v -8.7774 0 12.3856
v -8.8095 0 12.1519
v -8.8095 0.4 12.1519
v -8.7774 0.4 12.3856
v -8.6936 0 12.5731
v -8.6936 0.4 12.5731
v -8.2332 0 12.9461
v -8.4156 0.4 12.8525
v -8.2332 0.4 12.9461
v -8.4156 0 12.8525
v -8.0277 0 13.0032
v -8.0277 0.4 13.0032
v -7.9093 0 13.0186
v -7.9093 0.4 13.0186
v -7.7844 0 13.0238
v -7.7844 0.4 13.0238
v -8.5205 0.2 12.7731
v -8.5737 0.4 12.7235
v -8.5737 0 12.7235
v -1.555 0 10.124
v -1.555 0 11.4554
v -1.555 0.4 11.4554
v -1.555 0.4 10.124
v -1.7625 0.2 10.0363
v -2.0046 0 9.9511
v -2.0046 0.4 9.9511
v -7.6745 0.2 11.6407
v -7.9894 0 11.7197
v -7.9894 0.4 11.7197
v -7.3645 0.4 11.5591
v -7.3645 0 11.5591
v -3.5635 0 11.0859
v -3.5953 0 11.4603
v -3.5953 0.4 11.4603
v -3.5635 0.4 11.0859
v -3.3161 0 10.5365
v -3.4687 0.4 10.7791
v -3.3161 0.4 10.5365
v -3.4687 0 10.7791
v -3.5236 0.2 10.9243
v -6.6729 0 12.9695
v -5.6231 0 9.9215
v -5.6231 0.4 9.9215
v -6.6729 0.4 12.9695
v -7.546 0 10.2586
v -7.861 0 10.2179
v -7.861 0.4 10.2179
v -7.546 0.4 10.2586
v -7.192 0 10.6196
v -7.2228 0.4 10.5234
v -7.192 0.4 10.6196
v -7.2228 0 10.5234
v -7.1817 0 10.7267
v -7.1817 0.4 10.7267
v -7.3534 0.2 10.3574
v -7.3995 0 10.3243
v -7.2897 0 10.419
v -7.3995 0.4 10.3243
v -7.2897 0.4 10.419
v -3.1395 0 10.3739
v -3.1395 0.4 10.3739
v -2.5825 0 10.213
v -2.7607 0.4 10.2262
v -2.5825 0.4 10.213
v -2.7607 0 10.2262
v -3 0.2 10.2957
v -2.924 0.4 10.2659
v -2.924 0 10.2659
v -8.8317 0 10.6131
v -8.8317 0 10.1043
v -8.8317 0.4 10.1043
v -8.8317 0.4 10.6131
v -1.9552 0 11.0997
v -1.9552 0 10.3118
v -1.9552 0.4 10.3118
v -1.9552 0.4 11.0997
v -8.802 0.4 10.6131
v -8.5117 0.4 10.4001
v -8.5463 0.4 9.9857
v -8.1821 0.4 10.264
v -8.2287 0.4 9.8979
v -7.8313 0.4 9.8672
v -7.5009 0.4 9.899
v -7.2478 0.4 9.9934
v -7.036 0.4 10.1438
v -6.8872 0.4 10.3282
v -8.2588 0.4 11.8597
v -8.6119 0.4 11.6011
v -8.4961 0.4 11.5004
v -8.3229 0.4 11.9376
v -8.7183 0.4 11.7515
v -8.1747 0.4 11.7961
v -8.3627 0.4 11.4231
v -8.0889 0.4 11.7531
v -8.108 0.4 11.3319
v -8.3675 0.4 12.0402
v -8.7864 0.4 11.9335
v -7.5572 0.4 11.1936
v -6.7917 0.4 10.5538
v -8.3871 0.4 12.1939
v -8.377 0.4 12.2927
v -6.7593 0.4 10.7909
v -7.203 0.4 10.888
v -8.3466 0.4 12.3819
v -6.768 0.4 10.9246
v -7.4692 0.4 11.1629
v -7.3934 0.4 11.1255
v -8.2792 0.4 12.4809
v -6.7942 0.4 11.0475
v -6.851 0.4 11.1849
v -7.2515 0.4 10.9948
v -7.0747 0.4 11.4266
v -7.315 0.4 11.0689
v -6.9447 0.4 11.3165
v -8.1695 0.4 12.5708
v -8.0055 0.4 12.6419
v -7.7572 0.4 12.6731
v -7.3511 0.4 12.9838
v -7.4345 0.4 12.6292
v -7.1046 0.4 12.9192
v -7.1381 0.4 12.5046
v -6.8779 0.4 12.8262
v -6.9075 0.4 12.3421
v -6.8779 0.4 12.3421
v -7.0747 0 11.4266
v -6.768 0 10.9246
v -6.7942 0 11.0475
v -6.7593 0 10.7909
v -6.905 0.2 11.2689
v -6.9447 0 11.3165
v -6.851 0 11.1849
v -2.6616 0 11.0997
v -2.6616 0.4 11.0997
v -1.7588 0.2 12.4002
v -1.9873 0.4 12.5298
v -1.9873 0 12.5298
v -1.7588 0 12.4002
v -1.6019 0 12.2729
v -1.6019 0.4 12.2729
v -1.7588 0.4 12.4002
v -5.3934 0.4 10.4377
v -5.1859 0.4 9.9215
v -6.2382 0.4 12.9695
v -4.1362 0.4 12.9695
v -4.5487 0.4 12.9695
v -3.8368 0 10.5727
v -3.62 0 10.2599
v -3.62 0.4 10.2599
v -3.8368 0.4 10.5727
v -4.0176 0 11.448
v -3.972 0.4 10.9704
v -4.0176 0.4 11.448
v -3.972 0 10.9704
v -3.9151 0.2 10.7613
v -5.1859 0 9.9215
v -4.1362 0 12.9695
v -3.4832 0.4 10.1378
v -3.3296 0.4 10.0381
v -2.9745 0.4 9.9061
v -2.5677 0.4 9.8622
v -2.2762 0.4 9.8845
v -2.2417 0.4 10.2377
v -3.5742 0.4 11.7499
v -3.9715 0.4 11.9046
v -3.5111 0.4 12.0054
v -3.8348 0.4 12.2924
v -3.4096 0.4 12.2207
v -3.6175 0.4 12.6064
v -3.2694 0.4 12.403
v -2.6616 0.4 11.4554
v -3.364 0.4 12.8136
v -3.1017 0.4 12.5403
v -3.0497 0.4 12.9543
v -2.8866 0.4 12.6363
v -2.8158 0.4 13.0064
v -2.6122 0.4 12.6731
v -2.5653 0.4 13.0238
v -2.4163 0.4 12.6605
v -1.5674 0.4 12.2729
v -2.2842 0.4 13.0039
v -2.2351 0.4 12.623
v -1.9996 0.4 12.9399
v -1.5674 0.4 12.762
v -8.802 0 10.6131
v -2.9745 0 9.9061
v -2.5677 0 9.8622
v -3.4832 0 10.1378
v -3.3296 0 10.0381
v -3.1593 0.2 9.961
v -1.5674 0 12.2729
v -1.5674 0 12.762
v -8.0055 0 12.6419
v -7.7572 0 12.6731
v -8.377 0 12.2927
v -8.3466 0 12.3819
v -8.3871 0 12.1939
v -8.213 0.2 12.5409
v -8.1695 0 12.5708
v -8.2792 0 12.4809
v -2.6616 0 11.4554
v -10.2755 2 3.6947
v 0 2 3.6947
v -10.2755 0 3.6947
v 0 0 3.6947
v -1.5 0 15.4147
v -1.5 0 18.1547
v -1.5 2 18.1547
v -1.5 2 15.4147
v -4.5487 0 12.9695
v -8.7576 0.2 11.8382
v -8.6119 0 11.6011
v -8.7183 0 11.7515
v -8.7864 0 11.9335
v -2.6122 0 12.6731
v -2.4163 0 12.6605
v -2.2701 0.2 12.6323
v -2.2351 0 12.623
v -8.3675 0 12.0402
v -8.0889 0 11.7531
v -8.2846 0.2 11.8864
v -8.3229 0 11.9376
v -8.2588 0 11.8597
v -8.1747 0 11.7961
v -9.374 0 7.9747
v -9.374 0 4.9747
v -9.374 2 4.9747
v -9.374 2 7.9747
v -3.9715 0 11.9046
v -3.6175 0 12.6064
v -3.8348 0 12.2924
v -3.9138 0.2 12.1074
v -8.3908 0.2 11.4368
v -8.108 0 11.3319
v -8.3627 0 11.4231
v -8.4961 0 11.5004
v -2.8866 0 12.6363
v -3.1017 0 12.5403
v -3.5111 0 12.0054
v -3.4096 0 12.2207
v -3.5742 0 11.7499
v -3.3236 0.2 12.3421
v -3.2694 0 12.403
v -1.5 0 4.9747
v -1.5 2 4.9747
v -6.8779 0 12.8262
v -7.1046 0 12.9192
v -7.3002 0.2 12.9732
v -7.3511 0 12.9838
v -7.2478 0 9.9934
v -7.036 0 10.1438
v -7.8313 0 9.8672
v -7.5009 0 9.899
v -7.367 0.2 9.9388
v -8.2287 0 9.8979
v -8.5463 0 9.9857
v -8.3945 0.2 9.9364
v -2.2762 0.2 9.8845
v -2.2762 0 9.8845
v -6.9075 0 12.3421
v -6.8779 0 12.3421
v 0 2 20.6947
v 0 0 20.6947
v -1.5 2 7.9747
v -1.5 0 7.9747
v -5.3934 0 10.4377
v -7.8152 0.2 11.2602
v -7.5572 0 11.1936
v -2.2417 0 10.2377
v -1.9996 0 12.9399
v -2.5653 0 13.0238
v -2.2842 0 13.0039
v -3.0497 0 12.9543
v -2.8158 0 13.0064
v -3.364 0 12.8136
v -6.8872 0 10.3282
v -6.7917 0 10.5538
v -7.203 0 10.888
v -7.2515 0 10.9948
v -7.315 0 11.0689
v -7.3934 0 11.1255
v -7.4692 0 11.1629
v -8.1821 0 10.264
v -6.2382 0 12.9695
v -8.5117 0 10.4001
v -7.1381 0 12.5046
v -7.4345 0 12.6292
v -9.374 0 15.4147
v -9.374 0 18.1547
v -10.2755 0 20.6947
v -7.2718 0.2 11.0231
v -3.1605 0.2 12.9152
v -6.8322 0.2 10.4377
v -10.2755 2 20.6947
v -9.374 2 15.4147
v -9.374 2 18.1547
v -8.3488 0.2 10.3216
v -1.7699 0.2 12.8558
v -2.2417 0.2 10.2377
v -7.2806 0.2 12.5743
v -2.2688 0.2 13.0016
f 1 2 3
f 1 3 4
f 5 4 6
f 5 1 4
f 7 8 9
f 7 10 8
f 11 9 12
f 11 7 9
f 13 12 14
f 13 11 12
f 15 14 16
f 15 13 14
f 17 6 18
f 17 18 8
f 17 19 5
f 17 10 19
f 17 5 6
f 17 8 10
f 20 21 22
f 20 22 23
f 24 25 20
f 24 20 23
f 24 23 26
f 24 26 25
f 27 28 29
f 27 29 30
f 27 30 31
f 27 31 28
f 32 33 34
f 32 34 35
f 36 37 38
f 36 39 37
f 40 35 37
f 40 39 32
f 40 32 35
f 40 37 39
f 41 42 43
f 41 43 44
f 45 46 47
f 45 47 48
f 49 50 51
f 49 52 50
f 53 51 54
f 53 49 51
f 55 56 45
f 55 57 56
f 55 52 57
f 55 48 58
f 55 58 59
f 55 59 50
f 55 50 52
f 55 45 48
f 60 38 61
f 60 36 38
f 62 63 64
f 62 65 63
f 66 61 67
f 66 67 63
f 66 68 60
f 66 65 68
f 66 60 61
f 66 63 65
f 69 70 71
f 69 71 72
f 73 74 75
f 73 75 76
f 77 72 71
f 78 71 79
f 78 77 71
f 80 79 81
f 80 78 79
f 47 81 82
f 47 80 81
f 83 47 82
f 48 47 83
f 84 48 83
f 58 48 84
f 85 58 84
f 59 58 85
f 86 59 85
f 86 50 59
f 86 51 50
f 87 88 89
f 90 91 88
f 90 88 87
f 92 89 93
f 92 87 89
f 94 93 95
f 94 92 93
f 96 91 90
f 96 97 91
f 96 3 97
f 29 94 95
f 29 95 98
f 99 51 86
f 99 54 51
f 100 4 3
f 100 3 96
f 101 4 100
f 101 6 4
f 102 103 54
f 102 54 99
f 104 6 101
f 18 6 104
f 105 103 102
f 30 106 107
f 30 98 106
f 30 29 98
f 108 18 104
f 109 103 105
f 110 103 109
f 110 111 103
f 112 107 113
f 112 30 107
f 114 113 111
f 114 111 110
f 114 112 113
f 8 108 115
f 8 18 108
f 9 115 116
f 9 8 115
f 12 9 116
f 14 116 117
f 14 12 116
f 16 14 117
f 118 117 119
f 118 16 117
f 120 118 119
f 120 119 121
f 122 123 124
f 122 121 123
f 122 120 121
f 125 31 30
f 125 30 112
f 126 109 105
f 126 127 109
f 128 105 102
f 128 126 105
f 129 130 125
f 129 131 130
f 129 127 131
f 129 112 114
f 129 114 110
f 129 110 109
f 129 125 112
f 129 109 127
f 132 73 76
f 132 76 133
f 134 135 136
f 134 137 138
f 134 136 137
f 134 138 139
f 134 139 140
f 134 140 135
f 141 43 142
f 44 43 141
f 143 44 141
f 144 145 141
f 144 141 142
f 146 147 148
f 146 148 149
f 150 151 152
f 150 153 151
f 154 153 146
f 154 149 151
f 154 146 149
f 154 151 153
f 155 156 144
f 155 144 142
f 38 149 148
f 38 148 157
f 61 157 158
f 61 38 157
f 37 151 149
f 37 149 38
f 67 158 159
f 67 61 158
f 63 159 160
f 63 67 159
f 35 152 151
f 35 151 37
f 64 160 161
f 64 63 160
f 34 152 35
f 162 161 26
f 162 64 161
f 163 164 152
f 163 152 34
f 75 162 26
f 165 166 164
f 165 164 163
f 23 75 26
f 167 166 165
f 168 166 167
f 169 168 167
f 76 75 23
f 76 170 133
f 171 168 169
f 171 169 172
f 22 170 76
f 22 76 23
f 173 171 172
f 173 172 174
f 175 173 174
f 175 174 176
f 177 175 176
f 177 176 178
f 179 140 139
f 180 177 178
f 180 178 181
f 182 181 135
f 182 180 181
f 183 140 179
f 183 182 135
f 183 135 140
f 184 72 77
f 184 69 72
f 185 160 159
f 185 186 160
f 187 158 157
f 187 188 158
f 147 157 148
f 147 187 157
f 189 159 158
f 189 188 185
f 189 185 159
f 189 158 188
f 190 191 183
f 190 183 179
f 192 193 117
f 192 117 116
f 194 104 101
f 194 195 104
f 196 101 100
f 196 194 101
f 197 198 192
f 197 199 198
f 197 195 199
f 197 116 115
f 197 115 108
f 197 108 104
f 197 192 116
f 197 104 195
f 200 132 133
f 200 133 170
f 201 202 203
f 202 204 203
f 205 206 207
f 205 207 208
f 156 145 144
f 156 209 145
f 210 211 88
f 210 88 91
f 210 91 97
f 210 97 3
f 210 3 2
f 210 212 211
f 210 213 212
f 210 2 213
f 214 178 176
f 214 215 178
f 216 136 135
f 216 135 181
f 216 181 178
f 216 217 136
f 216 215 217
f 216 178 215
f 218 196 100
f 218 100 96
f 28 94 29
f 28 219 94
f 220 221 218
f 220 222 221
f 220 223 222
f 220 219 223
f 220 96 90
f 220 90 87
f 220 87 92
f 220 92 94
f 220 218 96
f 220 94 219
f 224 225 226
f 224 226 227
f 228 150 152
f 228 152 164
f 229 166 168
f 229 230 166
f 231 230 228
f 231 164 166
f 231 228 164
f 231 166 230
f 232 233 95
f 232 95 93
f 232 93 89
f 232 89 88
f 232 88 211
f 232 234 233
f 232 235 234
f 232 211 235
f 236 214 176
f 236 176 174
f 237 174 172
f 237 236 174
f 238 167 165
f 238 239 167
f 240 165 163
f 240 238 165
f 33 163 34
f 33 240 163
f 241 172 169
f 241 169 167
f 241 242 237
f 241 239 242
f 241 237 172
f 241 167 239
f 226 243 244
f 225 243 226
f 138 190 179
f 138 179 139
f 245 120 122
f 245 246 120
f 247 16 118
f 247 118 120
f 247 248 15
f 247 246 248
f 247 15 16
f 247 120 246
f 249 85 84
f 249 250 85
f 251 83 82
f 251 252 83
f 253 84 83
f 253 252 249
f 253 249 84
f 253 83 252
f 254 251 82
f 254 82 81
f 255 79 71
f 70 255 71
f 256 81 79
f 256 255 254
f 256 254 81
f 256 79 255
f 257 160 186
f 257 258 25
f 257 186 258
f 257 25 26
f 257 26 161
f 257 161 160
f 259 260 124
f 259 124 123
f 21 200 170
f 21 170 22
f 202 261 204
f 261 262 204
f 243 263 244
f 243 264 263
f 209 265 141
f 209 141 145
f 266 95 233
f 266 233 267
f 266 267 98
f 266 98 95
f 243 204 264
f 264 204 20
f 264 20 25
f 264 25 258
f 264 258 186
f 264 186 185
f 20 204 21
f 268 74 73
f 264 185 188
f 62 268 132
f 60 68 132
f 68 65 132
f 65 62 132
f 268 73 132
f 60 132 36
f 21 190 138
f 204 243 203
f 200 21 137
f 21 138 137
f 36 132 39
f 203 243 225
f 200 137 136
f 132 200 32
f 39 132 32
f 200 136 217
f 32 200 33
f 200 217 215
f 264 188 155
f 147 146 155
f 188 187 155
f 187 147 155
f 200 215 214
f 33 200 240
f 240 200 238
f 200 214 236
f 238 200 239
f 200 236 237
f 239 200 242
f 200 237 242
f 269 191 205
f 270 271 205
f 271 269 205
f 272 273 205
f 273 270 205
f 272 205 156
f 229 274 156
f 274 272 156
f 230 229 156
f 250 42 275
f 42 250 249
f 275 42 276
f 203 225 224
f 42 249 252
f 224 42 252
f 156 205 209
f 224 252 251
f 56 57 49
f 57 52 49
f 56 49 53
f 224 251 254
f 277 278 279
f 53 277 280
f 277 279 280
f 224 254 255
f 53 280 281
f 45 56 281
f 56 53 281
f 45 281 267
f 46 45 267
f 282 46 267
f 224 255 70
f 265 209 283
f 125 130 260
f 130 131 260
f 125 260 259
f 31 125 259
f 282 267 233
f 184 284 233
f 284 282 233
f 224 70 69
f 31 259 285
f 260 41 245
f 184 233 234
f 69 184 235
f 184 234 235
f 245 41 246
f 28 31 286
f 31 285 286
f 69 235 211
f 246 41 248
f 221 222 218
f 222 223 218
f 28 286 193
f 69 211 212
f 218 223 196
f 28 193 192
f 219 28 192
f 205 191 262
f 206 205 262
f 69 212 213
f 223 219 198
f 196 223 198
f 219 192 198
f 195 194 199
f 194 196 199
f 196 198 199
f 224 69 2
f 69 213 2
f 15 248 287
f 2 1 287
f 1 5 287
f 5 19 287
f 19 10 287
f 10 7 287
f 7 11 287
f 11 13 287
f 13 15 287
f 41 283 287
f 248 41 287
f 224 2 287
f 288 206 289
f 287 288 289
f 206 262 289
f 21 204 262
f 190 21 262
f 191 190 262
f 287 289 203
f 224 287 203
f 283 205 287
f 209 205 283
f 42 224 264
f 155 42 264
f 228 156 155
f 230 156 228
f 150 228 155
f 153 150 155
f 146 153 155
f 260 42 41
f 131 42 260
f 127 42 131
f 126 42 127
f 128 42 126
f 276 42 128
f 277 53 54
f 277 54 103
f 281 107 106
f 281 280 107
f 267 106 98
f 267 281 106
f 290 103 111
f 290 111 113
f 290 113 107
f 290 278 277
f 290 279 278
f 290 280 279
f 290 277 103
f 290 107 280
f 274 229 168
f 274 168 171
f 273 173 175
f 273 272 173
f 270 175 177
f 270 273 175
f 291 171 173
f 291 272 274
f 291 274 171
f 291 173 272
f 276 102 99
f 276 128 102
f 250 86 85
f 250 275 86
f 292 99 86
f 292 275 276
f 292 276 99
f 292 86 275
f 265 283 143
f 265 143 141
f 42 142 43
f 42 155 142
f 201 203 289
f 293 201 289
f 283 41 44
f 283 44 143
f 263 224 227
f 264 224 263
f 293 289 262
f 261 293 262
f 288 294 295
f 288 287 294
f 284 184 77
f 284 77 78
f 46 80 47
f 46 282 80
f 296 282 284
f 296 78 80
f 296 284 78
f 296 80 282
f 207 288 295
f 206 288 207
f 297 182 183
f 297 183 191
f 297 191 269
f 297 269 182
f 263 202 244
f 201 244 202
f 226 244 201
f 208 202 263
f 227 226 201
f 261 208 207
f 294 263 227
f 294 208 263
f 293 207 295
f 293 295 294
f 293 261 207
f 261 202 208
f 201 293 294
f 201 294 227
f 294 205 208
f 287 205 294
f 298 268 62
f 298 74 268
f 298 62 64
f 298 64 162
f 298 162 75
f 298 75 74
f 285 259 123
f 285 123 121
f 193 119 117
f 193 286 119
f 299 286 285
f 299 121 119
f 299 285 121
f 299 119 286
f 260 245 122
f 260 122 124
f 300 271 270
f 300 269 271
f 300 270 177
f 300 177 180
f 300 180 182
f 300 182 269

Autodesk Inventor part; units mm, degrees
ref_plane "YZ Plane" through (0, 0, 0) normal (1, 0, 0) x (0, 1, 0)
ref_plane "XZ Plane" through (0, 0, 0) normal (0, 1, 0) x (-1, 0, 0)
ref_plane "XY Plane" through (0, 0, 0) normal (0, 0, 1) x (1, 0, 0)
sketch "Эскиз1" plane through (0, 0, 0) normal (0, 1, 0) x (-1, 0, 0)
  line L0 (9.374, 18.1547) -> (1.5, 18.1547)
  line L1 (1.5, 18.1547) -> (1.5, 15.4147)
  line L2 (1.5, 15.4147) -> (9.374, 15.4147)
  line L3 (9.374, 15.4147) -> (9.374, 18.1547)
  line L4 (9.374, 7.9747) -> (1.5, 7.9747)
  line L5 (1.5, 7.9747) -> (1.5, 4.9747)
  line L6 (1.5, 4.9747) -> (9.374, 4.9747)
  line L7 (9.374, 4.9747) -> (9.374, 7.9747)
  line L8 (10.2755, 20.6947) -> (0, 20.6947)
  line L9 (0, 20.6947) -> (0, 3.6947)
  line L10 (0, 3.6947) -> (10.2755, 3.6947)
  line L11 (10.2755, 3.6947) -> (10.2755, 20.6947)
  point P0 (0, 0)
  dimension "d3" = 17
  dimension "d4" = 7.874
  dimension "d5" = 2.74
  dimension "d6" = 2.54
  dimension "d7" = 7.44
  dimension "d8" = 1.5
  dimension "d11" = 3
extrude "Выдавливание1" add sketch "Эскиз1" along normal blind 2
sketch "Эскиз3" plane through (0, 0, 0) normal (0, -1, 0) x (1, 0, 0)
  line L0 (-8.9898, 13.0238) -> (-0.8671, 13.0238) construction
  line L1 (-0.8671, 13.0238) -> (-0.8671, 9.5038) construction
  line L2 (-0.8671, 9.5038) -> (-8.9898, 9.5038) construction
  line L3 (-8.9898, 9.5038) -> (-8.9898, 13.0238) construction
  spline S0 degree 2 poles (-7.8313, 9.8672) (-8.1623, 9.8672) (-8.6267, 10.0055) (-8.8317, 10.1043) knots 0 0 0 1 2 2 2
  line L4 (-8.8317, 10.1043) -> (-8.8317, 10.6131)
  line L5 (-8.8317, 10.6131) -> (-8.802, 10.6131)
  spline S1 degree 2 poles (-8.802, 10.6131) (-8.602, 10.4254) (-8.0956, 10.2179) (-7.861, 10.2179) knots 0 0 0 1 2 2 2
  spline S2 degree 2 poles (-7.861, 10.2179) (-7.525, 10.2179) (-7.1817, 10.497) (-7.1817, 10.7267) knots 0 0 0 1 2 2 2
  spline S3 degree 2 poles (-7.1817, 10.7267) (-7.1817, 10.9095) (-7.362, 11.1367) (-7.5572, 11.1936) knots 0 0 0 1 2 2 2
  spline S4 degree 2 poles (-7.5572, 11.1936) (-7.6979, 11.2331) (-7.9326, 11.2874) (-8.108, 11.3319) knots 0 0 0 1 2 2 2
  spline S5 degree 2 poles (-8.108, 11.3319) (-8.2661, 11.3739) (-8.5155, 11.4998) (-8.6119, 11.6011) knots 0 0 0 1 2 2 2
  spline S6 degree 2 poles (-8.6119, 11.6011) (-8.7057, 11.7024) (-8.8095, 11.9741) (-8.8095, 12.1519) knots 0 0 0 1 2 2 2
  spline S7 degree 2 poles (-8.8095, 12.1519) (-8.8095, 12.5224) (-8.2315, 13.0238) (-7.7844, 13.0238) knots 0 0 0 1 2 2 2
  spline S8 degree 2 poles (-7.7844, 13.0238) (-7.5275, 13.0238) (-7.073, 12.9226) (-6.8779, 12.8262) knots 0 0 0 1 2 2 2
  line L6 (-6.8779, 12.8262) -> (-6.8779, 12.3421)
  line L7 (-6.8779, 12.3421) -> (-6.9075, 12.3421)
  spline S9 degree 2 poles (-6.9075, 12.3421) (-7.0533, 12.4755) (-7.5078, 12.6731) (-7.7572, 12.6731) knots 0 0 0 1 2 2 2
  spline S10 degree 2 poles (-7.7572, 12.6731) (-8.0388, 12.6731) (-8.3871, 12.4088) (-8.3871, 12.1939) knots 0 0 0 1 2 2 2
  spline S11 degree 2 poles (-8.3871, 12.1939) (-8.3871, 12.0012) (-8.1821, 11.7715) (-7.9894, 11.7197) knots 0 0 0 1 2 2 2
  spline S12 degree 2 poles (-7.9894, 11.7197) (-7.861, 11.6851) (-7.488, 11.5962) (-7.3645, 11.5591) knots 0 0 0 1 2 2 2
  spline S13 degree 2 poles (-7.3645, 11.5591) (-7.0508, 11.4628) (-6.7593, 11.075) (-6.7593, 10.7909) knots 0 0 0 1 2 2 2
  spline S14 degree 2 poles (-6.7593, 10.7909) (-6.7593, 10.6106) (-6.9051, 10.2648) (-7.036, 10.1438) knots 0 0 0 1 2 2 2
  spline S15 degree 2 poles (-7.036, 10.1438) (-7.1817, 10.0104) (-7.5522, 9.8672) (-7.8313, 9.8672) knots 0 0 0 1 2 2 2
  line L8 (-4.1362, 12.9695) -> (-5.1859, 9.9215)
  line L9 (-5.1859, 9.9215) -> (-5.6231, 9.9215)
  line L10 (-5.6231, 9.9215) -> (-6.6729, 12.9695)
  line L11 (-6.6729, 12.9695) -> (-6.2382, 12.9695)
  line L12 (-6.2382, 12.9695) -> (-5.3934, 10.4377)
  line L13 (-5.3934, 10.4377) -> (-4.5487, 12.9695)
  line L14 (-4.5487, 12.9695) -> (-4.1362, 12.9695)
  spline S16 degree 2 poles (-2.5677, 9.8622) (-2.8913, 9.8622) (-3.4273, 10.0598) (-3.62, 10.2599) knots 0 0 0 1 2 2 2
  spline S17 degree 2 poles (-3.62, 10.2599) (-3.8126, 10.4624) (-4.0176, 11.0602) (-4.0176, 11.448) knots 0 0 0 1 2 2 2
  spline S18 degree 2 poles (-4.0176, 11.448) (-4.0176, 11.816) (-3.8101, 12.3989) (-3.6175, 12.6064) knots 0 0 0 1 2 2 2
  spline S19 degree 2 poles (-3.6175, 12.6064) (-3.4322, 12.8065) (-2.8888, 13.0238) (-2.5653, 13.0238) knots 0 0 0 1 2 2 2
  spline S20 degree 2 poles (-2.5653, 13.0238) (-2.4096, 13.0238) (-2.1281, 12.9794) (-1.9996, 12.9399) knots 0 0 0 1 2 2 2
  spline S21 degree 2 poles (-1.9996, 12.9399) (-1.8959, 12.9102) (-1.6439, 12.8015) (-1.5674, 12.762) knots 0 0 0 1 2 2 2
  line L15 (-1.5674, 12.762) -> (-1.5674, 12.2729)
  line L16 (-1.5674, 12.2729) -> (-1.6019, 12.2729)
  spline S22 degree 2 poles (-1.6019, 12.2729) (-1.6785, 12.3396) (-1.8391, 12.4607) (-1.9873, 12.5298) knots 0 0 0 1 2 2 2
  spline S23 degree 2 poles (-1.9873, 12.5298) (-2.1108, 12.5916) (-2.4294, 12.6731) (-2.6122, 12.6731) knots 0 0 0 1 2 2 2
  spline S24 degree 2 poles (-2.6122, 12.6731) (-3.0518, 12.6731) (-3.5953, 12.0111) (-3.5953, 11.4603) knots 0 0 0 1 2 2 2
  spline S25 degree 2 poles (-3.5953, 11.4603) (-3.5953, 11.154) (-3.452, 10.6946) (-3.3161, 10.5365) knots 0 0 0 1 2 2 2
  spline S26 degree 2 poles (-3.3161, 10.5365) (-3.1852, 10.3784) (-2.8147, 10.213) (-2.5825, 10.213) knots 0 0 0 1 2 2 2
  spline S27 degree 2 poles (-2.5825, 10.213) (-2.4121, 10.213) (-2.0713, 10.2624) (-1.9552, 10.3118) knots 0 0 0 1 2 2 2
  line L17 (-1.9552, 10.3118) -> (-1.9552, 11.0997)
  line L18 (-1.9552, 11.0997) -> (-2.6616, 11.0997)
  line L19 (-2.6616, 11.0997) -> (-2.6616, 11.4554)
  line L20 (-2.6616, 11.4554) -> (-1.555, 11.4554)
  line L21 (-1.555, 11.4554) -> (-1.555, 10.124)
  spline S28 degree 2 poles (-1.555, 10.124) (-1.6316, 10.0895) (-1.8934, 9.9832) (-2.0046, 9.9511) knots 0 0 0 1 2 2 2
  spline S29 degree 2 poles (-2.0046, 9.9511) (-2.1552, 9.9067) (-2.3973, 9.8622) (-2.5677, 9.8622) knots 0 0 0 1 2 2 2
  point P0 (0, 0)
extrude "Выдавливание2" cut sketch "Эскиз3" against normal blind 0.4
properties part number "подшипник_крепеж"
